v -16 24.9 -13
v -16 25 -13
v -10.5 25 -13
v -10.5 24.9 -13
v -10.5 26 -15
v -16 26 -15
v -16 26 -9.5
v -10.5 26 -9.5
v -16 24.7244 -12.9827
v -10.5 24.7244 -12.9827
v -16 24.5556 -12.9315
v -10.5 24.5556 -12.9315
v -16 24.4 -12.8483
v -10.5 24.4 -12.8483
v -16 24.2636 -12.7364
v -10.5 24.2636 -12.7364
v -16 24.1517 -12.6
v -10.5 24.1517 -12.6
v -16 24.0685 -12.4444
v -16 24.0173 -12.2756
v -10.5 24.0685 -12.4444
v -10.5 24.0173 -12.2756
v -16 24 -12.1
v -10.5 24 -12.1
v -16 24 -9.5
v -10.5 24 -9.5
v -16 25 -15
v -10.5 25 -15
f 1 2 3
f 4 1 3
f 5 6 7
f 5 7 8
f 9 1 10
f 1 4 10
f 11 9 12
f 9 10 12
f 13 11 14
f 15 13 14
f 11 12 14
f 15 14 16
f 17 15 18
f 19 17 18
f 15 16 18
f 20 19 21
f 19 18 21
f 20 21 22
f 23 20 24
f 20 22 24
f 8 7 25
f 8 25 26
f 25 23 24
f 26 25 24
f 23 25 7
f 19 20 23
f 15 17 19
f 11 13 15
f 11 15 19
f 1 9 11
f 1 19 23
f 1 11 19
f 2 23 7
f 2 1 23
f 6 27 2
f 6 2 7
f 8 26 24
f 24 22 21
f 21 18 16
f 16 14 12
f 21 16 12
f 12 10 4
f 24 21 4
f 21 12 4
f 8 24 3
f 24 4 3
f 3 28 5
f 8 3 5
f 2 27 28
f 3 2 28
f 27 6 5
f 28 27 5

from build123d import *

# Parameters (mm, degrees)
BOX023_W     = 5.5
BOX023_H     = 1
BOX023_DEPTH = 2
BOX022_W     = 5.5
BOX022_H     = 2
BOX022_DEPTH = 5.5
FILLET005_R  = 0.9


with BuildPart() as button_1_cut003:
    # Box023 → Box023 (new body)
    with BuildSketch(Plane(origin=(5, 24, -15), x_dir=(1, 0, 0), z_dir=(0, 0, 1))):
        with Locations((2.75, 0.5)):
            Rectangle(BOX023_W, BOX023_H)
    extrude(amount=BOX023_DEPTH)


with BuildPart() as fillet005:
    # Box022 → Box022 (new body)
    with BuildSketch(Plane(origin=(5, 24, -15), x_dir=(1, 0, 0), z_dir=(0, 0, 1))):
        with Locations((2.75, 1)):
            Rectangle(BOX022_W, BOX022_H)
    extrude(amount=BOX022_DEPTH)

    # Cut003: cut Button 1 Cut003
    add(button_1_cut003.part, mode=Mode.SUBTRACT)

    # Fillet005
    fillet005_edges = [fillet005.edges().sort_by_distance(p)[0] for p in [
        (7.75, 24, -13),
    ]]
    fillet(fillet005_edges, radius=FILLET005_R)


with BuildPart() as fillet005_1:
    # Fillet005 placement: moved
    add(fillet005.part.moved(Location((-21, 0, 0))))


solid = fillet005_1.part
